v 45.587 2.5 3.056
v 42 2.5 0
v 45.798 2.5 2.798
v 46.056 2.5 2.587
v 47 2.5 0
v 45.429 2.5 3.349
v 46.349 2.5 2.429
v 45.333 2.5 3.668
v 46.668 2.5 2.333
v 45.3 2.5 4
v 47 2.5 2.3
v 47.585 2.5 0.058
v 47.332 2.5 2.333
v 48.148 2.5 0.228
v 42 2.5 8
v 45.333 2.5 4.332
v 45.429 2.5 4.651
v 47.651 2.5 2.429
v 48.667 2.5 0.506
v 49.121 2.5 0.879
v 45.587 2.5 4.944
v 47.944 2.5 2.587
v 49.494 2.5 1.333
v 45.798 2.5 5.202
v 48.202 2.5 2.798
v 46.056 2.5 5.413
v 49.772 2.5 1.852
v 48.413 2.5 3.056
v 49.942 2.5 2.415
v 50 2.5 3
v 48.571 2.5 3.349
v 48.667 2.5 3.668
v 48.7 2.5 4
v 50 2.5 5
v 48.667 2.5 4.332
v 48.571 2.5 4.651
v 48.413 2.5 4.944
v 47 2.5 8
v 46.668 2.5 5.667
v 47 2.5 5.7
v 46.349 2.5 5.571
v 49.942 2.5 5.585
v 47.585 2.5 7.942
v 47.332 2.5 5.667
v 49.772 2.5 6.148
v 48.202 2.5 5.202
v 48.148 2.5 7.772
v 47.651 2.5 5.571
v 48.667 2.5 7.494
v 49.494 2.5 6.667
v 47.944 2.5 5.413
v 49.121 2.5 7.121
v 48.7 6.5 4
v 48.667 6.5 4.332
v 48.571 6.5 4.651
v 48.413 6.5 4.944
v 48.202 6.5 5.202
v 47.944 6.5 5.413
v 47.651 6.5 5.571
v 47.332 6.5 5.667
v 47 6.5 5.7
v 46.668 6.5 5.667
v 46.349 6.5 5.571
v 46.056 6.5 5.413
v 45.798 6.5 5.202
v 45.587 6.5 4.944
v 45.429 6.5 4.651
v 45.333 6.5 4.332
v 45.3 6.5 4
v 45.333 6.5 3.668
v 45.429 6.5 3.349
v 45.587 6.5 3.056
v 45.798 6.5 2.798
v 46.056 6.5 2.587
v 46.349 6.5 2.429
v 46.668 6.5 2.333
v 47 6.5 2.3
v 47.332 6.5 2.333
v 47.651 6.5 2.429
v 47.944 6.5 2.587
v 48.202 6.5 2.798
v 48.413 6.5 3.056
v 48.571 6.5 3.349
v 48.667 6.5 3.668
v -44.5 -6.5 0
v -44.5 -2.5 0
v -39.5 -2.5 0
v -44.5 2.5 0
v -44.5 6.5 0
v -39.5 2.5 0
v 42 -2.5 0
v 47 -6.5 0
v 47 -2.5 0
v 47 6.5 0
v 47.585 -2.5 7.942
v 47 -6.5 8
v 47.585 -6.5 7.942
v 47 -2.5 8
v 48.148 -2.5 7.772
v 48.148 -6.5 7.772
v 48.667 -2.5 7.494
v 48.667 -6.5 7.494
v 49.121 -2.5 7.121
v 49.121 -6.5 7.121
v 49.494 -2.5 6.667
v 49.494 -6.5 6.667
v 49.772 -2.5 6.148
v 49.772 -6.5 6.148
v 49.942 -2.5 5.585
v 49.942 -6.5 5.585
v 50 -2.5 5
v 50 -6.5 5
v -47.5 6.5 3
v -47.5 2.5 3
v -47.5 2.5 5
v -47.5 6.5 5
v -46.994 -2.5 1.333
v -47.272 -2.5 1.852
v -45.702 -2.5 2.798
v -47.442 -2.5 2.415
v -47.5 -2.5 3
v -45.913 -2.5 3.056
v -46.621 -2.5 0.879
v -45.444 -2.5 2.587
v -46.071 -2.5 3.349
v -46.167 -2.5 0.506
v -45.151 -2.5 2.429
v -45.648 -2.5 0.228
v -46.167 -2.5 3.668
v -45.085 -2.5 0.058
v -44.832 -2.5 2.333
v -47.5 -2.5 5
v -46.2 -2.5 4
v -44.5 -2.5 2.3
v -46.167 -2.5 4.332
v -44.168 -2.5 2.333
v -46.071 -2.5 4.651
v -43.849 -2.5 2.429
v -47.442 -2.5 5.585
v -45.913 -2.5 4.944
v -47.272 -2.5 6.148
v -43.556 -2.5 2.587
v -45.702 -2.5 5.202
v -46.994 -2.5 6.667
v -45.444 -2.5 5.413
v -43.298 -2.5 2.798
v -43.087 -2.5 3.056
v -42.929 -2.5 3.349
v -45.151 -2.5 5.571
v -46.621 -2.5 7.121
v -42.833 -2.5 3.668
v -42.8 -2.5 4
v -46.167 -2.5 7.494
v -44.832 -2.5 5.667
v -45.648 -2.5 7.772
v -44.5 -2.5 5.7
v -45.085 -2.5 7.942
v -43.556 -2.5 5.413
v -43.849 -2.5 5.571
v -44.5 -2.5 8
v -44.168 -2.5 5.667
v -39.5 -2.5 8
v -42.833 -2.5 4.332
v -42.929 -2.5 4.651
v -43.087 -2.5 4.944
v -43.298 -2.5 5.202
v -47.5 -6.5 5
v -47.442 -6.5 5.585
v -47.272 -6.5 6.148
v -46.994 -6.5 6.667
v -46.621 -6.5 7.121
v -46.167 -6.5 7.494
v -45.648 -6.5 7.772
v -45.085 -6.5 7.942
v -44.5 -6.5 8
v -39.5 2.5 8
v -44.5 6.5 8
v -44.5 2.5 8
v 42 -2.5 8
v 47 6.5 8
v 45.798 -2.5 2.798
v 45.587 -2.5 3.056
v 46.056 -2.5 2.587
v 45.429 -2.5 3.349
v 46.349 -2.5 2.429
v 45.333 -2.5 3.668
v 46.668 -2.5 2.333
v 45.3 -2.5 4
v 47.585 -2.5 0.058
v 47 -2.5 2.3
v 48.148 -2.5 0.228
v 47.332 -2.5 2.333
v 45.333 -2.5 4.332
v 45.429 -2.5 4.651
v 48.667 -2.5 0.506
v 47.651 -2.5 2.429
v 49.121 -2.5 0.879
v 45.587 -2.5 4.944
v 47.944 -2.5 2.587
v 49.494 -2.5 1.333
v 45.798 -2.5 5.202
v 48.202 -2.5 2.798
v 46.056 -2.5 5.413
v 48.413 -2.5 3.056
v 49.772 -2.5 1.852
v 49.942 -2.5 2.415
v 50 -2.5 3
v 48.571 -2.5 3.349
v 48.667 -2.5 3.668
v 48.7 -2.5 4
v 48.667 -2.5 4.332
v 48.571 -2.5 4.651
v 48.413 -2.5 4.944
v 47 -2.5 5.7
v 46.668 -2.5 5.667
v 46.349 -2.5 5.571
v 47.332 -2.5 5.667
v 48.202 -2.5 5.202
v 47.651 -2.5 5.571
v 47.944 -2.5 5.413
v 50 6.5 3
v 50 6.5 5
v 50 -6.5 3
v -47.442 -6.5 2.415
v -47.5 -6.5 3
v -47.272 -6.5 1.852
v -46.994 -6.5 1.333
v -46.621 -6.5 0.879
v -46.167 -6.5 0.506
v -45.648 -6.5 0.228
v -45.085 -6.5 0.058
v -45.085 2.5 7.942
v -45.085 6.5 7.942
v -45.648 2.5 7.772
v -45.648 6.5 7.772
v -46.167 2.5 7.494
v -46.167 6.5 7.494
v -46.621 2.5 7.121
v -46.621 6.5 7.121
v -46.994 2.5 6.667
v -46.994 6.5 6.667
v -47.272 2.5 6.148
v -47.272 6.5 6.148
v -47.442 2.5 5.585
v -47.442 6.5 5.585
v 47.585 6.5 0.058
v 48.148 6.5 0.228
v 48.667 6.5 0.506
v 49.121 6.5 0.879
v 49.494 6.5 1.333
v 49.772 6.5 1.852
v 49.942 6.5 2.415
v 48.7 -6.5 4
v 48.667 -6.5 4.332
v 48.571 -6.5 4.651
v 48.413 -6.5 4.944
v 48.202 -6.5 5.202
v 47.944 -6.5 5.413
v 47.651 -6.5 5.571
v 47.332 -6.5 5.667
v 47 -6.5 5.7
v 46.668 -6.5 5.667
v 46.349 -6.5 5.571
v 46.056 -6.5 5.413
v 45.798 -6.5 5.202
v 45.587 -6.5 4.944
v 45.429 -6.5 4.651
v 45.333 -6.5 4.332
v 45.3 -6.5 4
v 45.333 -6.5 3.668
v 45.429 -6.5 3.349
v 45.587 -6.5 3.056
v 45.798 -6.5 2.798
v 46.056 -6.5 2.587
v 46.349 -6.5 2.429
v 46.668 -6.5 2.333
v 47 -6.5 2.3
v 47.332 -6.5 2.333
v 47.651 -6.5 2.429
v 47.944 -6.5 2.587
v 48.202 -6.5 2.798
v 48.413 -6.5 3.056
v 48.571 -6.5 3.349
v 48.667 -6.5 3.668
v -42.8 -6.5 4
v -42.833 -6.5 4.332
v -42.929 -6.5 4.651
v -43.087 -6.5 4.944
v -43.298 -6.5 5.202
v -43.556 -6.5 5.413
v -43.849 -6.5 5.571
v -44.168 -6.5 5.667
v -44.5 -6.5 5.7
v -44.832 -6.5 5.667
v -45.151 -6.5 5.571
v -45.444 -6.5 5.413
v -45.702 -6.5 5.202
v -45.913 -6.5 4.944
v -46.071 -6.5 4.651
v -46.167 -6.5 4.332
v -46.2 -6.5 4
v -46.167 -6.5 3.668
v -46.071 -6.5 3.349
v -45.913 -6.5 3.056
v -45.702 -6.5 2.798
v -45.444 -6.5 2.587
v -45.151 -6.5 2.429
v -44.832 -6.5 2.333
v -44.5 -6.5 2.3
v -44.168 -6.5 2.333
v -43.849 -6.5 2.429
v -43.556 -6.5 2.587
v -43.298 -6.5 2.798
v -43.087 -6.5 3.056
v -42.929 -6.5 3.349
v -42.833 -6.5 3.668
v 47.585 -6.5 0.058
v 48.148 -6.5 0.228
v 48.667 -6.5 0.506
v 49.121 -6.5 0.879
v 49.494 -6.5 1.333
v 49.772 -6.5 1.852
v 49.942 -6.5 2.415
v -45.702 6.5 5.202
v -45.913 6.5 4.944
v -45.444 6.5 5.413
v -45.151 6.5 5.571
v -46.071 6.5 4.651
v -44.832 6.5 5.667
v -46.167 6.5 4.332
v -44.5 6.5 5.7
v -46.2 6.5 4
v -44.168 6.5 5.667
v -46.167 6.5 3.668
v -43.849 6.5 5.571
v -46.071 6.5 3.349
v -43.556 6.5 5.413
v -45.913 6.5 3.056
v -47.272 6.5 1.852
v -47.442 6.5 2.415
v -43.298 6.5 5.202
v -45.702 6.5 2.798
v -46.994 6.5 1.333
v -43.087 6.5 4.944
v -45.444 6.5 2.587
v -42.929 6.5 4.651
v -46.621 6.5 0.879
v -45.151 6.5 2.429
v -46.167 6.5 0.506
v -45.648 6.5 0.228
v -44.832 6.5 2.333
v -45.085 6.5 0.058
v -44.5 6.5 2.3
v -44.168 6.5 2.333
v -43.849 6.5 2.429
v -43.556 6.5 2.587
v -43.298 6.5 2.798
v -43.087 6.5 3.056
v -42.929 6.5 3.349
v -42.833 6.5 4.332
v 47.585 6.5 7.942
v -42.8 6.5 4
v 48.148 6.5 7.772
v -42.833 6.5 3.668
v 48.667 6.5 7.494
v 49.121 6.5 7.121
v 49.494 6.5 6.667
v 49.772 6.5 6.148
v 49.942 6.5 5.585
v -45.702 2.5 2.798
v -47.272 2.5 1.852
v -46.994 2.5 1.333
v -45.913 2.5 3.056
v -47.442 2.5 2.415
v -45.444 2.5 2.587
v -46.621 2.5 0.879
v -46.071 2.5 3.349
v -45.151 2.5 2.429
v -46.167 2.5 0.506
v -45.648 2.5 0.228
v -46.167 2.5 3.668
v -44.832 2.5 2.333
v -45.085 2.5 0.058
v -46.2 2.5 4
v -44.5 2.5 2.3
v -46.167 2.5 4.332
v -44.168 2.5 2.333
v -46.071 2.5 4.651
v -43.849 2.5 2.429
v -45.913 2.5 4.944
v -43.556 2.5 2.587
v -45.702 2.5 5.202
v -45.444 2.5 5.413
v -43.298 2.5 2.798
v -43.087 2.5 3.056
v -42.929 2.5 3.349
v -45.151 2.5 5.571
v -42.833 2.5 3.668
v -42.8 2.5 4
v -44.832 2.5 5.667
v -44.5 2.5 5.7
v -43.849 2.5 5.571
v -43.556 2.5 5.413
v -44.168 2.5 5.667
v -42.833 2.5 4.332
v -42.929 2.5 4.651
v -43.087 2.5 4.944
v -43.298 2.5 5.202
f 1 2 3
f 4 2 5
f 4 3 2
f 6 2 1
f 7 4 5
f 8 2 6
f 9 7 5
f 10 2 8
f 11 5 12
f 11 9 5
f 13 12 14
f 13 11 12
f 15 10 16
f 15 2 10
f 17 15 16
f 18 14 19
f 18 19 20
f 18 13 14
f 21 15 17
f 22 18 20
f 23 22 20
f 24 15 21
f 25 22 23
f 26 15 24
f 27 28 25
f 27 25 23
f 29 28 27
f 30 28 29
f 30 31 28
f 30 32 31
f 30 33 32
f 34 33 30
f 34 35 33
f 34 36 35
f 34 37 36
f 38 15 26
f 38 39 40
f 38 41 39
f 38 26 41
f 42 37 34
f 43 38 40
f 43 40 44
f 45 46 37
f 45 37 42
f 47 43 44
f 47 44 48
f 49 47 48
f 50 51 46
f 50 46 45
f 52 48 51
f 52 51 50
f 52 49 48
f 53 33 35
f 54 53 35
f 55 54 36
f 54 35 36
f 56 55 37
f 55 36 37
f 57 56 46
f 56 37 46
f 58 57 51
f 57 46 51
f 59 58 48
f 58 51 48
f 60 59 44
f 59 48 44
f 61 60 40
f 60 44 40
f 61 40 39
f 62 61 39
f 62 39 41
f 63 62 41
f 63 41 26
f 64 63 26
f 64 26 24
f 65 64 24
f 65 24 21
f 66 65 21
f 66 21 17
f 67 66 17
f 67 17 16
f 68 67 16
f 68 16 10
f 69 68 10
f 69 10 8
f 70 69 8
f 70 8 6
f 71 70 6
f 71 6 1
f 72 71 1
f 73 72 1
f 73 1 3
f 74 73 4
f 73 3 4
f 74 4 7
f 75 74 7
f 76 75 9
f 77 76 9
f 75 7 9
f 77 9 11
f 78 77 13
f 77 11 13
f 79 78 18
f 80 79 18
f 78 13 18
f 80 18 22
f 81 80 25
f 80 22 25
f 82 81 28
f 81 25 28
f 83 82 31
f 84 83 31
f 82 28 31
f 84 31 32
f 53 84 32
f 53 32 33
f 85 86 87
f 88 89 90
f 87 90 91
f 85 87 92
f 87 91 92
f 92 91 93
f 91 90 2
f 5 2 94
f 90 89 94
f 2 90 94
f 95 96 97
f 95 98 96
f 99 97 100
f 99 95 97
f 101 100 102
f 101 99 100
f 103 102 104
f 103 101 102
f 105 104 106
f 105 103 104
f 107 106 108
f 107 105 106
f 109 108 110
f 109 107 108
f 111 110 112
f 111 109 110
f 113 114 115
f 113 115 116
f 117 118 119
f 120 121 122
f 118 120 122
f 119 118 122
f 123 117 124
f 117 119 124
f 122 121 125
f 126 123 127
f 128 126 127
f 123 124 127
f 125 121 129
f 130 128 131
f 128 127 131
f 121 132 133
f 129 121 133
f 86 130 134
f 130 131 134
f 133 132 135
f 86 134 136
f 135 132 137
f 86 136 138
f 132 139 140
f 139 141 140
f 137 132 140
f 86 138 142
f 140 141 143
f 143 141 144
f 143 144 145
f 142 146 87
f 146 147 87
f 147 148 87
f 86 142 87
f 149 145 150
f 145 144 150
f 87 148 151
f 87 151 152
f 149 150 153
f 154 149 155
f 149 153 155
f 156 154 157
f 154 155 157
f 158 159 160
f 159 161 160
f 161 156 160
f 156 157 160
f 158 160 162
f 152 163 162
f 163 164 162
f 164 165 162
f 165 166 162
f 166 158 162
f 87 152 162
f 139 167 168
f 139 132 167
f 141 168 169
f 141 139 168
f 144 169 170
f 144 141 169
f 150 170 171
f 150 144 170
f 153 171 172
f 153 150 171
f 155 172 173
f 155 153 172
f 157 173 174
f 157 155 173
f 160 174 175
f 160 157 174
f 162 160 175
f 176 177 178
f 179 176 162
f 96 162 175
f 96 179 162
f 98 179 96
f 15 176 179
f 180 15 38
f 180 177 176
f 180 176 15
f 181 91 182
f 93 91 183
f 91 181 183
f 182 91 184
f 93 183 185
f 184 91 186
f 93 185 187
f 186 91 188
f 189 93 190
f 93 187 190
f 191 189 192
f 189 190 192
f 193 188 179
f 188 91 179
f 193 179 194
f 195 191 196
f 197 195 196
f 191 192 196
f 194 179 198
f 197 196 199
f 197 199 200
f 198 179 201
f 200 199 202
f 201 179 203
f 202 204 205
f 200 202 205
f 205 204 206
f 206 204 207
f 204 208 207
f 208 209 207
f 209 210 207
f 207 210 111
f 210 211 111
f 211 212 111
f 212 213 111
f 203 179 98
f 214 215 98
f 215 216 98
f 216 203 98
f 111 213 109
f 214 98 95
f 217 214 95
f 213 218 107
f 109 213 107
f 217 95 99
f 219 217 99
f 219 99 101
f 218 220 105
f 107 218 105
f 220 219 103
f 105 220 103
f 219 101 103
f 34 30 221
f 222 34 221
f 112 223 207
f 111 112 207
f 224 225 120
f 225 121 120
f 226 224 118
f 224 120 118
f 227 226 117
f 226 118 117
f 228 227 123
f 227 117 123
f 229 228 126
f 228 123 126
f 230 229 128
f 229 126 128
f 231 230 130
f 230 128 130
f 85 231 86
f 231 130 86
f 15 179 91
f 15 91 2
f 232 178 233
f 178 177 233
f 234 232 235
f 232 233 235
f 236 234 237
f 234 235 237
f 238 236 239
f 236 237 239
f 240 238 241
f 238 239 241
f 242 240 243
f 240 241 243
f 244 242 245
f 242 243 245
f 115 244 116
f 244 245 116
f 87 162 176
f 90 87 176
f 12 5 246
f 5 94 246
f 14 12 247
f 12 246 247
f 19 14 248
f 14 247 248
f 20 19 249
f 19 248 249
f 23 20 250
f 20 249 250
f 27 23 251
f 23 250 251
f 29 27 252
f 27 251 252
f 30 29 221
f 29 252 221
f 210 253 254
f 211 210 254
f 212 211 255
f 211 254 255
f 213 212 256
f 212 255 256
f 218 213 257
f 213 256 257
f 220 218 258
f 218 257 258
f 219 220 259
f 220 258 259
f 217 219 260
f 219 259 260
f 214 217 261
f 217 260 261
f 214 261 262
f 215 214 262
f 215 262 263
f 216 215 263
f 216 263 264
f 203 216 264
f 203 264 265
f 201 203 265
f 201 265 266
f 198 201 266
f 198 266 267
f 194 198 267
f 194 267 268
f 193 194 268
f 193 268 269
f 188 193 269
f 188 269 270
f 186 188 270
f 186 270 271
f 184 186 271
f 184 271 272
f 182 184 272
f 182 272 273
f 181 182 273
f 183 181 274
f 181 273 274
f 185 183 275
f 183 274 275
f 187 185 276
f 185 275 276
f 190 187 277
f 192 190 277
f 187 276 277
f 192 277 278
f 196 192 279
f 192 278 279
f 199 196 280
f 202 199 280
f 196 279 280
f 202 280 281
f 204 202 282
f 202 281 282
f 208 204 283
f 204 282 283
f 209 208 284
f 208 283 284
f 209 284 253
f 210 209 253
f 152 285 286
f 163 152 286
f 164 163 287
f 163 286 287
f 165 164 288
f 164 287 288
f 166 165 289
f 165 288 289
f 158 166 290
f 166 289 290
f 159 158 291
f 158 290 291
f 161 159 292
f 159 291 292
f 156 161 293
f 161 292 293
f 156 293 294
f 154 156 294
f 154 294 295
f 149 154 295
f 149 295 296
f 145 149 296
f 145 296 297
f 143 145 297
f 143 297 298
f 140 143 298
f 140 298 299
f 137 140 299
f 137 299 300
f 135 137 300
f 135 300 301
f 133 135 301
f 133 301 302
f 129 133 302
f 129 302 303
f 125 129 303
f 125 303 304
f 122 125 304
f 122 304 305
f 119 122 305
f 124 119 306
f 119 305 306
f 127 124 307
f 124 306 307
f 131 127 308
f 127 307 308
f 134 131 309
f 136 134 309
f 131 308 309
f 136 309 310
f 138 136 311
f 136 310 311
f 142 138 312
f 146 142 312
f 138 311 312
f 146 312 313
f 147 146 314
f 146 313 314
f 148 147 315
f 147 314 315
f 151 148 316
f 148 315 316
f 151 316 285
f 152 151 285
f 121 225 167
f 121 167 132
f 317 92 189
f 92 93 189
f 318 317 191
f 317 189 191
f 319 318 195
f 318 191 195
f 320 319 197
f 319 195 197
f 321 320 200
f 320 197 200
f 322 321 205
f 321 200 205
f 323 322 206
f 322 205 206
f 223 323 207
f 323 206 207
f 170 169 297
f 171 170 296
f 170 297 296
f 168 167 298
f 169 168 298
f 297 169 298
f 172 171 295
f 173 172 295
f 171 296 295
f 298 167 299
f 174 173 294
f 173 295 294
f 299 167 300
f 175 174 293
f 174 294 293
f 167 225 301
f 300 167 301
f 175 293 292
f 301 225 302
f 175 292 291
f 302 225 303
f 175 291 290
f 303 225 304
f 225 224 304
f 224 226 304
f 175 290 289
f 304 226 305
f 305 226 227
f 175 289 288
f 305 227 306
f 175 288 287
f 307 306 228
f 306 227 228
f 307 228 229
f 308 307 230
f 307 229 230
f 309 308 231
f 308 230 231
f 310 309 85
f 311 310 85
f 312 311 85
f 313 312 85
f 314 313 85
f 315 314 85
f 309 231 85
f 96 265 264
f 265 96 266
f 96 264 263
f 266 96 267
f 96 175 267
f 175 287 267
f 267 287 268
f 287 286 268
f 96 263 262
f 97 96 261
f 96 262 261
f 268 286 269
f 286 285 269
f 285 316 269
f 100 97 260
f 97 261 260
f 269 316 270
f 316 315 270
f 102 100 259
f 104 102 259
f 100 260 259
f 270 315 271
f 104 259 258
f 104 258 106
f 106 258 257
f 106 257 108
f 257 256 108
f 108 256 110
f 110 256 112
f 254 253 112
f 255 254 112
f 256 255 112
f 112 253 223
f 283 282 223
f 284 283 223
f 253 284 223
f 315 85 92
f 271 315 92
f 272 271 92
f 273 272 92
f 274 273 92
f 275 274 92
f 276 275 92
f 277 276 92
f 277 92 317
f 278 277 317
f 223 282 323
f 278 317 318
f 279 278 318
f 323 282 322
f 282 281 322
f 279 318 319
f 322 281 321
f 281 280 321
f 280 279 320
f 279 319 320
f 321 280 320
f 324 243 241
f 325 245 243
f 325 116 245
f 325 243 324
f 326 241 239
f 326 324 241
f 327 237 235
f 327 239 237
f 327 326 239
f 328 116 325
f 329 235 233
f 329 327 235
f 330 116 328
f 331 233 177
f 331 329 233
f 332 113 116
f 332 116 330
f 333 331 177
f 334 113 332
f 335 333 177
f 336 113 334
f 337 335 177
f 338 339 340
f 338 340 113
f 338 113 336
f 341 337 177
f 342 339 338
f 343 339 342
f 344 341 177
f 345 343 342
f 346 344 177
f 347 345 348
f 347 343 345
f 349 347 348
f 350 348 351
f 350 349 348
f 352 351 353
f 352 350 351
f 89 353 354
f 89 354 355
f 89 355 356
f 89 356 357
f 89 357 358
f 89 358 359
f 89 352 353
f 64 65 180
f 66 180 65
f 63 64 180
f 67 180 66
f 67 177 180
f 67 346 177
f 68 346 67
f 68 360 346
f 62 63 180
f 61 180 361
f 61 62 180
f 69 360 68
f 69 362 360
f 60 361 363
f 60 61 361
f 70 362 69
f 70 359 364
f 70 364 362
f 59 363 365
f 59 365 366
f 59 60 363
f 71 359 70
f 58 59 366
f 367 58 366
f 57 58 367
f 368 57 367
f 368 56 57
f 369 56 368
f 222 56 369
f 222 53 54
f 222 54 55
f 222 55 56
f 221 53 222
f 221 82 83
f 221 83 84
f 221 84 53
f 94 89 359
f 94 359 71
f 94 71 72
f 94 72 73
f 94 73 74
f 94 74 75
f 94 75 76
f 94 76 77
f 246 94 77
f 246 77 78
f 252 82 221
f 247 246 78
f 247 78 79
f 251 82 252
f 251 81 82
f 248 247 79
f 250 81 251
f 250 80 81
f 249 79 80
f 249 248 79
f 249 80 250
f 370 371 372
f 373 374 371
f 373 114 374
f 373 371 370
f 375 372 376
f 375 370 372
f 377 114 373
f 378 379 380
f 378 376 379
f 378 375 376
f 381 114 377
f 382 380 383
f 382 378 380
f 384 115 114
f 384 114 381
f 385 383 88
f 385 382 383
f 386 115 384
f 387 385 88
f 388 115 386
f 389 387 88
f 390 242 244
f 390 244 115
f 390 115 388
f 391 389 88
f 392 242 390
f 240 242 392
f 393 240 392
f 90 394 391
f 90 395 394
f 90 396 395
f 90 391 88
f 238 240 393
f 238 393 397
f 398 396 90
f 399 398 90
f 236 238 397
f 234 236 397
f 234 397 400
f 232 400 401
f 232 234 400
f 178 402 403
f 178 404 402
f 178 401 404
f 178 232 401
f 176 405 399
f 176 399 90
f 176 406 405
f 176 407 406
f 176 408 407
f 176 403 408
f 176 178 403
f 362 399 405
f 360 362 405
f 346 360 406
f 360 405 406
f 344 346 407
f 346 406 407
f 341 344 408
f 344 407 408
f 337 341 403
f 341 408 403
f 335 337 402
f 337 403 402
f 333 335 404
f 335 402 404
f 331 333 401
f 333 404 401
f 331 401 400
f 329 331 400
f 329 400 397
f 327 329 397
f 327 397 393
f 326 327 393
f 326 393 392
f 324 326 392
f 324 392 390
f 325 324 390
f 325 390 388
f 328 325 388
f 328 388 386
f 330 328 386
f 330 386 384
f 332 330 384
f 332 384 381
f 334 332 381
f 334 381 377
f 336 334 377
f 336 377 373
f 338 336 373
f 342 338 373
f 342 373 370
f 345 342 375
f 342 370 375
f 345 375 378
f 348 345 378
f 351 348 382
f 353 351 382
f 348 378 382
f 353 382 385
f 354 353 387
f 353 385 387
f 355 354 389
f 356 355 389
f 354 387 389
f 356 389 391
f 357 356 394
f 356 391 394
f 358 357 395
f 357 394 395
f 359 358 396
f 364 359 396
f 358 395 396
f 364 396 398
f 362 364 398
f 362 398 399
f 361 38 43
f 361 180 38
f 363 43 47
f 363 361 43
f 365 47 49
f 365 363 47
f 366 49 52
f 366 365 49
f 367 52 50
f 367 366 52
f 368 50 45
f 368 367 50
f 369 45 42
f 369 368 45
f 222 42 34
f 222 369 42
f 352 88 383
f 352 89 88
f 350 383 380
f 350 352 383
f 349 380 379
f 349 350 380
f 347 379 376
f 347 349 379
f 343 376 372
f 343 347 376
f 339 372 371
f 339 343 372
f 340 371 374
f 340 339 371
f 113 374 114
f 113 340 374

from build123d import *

# Parameters (mm, degrees)
SKETCH_W        = 97.5
SKETCH_H        = 13
PAD_DEPTH       = 8
SKETCH001_R     = 1.7
POCKET_DEPTH    = 20
SKETCH002_W     = 8
SKETCH002_H     = 5
POCKET001_DEPTH = 20
FILLET_R        = 3


with BuildPart() as part:
    # Sketch → Pad (new body)
    with BuildSketch(Plane.XY):
        with Locations((1.25, 0)):
            Rectangle(SKETCH_W, SKETCH_H)
    extrude(amount=PAD_DEPTH)

    # Sketch001 (on Face1 of Pad) → Pocket (cut)
    with BuildSketch(Plane.XZ.offset(6.5)):
        with Locations((-44.5, 4)):
            Circle(SKETCH001_R)
        with Locations((47, 4)):
            Circle(SKETCH001_R)
    extrude(amount=-POCKET_DEPTH, mode=Mode.SUBTRACT)

    # Sketch002 (on Face4 of Pocket) → Pocket001 (cut)
    with BuildSketch(Plane.XY.offset(8)):
        with Locations((-43.5, 0)):
            Rectangle(SKETCH002_W, SKETCH002_H)
        with Locations((46, 0)):
            Rectangle(SKETCH002_W, SKETCH002_H)
    extrude(amount=-POCKET001_DEPTH, mode=Mode.SUBTRACT)

    # Fillet
    fillet_edges = [part.edges().sort_by_distance(p)[0] for p in [
        (50, 4.5, 8),
        (50, -4.5, 8),
        (50, -4.5, 0),
        (50, 4.5, 0),
        (-47.5, -4.5, 8),
        (-47.5, -4.5, 0),
        (-47.5, 4.5, 0),
        (-47.5, 4.5, 8),
    ]]
    fillet(fillet_edges, radius=FILLET_R)


solid = part.part
